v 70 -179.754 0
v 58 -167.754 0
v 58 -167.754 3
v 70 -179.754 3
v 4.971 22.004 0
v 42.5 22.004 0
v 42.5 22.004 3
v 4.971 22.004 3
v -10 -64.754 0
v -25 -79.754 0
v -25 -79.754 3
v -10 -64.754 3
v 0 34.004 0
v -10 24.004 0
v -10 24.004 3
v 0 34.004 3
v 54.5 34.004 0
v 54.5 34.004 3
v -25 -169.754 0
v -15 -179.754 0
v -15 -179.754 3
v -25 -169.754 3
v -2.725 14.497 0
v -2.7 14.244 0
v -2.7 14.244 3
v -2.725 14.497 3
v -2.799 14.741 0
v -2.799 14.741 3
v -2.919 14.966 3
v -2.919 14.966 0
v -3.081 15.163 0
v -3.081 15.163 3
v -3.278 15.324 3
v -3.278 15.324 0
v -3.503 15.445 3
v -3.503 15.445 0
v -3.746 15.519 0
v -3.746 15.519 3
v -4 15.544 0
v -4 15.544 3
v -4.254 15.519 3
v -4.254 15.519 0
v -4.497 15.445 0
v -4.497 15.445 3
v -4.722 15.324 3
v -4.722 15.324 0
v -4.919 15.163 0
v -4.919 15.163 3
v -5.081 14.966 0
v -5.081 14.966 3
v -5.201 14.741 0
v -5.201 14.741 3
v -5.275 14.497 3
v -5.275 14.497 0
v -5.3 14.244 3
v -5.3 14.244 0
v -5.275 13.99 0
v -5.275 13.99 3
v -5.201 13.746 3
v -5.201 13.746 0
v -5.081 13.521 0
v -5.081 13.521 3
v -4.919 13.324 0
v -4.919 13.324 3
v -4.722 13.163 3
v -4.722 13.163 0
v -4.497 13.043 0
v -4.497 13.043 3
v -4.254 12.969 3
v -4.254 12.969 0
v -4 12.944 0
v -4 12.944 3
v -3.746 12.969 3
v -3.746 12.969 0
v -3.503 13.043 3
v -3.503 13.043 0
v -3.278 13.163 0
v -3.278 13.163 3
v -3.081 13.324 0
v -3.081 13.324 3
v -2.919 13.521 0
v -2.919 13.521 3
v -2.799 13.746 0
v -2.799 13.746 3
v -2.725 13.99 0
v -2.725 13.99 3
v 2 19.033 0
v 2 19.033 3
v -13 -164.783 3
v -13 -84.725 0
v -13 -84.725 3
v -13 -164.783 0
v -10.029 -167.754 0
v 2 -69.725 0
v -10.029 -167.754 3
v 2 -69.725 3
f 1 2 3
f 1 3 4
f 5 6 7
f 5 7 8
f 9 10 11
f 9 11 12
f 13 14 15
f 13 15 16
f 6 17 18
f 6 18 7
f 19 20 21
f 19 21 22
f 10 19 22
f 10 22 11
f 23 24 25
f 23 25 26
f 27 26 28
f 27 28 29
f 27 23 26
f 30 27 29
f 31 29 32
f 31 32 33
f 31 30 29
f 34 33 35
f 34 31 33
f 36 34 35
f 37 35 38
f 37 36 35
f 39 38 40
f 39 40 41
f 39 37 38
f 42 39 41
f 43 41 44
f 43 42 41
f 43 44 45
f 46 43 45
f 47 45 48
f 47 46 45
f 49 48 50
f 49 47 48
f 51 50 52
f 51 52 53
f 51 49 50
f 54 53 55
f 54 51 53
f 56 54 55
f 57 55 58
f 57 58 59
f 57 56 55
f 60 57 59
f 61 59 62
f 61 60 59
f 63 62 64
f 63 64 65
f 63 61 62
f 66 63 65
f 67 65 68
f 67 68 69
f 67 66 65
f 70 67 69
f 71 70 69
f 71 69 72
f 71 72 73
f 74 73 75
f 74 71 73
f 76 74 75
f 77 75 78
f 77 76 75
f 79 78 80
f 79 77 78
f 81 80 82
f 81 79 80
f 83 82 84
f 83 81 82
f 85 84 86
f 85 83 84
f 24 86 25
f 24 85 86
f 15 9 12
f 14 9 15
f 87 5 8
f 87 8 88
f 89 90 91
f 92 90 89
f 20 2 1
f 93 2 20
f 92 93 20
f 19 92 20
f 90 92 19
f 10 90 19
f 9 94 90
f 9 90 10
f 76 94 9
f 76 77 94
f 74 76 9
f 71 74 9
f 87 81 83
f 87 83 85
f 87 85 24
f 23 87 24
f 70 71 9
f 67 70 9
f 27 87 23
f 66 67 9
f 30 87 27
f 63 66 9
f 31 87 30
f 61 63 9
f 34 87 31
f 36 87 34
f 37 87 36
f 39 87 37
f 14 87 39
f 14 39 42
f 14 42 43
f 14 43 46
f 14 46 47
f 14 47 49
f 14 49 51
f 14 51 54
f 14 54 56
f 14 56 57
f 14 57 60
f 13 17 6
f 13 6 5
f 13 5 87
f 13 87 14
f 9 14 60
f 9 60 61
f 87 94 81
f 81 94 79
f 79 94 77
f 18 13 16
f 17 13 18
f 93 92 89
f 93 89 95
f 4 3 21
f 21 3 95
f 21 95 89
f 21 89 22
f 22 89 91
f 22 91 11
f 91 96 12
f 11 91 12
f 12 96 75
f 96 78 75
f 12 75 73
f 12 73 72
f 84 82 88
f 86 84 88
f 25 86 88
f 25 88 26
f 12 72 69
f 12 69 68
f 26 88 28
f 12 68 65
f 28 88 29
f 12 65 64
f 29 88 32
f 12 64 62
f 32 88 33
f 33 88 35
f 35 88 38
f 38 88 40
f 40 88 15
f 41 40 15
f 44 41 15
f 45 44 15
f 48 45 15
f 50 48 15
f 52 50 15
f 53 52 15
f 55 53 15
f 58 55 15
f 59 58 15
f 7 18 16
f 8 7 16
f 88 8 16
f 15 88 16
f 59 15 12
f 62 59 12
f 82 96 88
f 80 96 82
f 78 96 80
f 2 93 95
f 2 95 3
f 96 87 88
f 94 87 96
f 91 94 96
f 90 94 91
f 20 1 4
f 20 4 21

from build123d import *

# Parameters (mm, degrees)
SKETCH1_R      = 1.3
EXTRUDE1_DEPTH = 3


with BuildPart() as part:
    # Sketch1 → Extrude1 (new body)
    with BuildSketch(Plane.XY):
        Polygon((70, -179.753959847), (-15, -179.753959847), (-25, -169.753959847), (-25, -79.753959847), (-10, -64.753959847), (-10, 24.003545781), (0, 34.003545781), (54.5, 34.003545781), (42.5, 22.003545781), (4.970562749, 22.003545781), (2, 19.032983033), (2, -69.724522596), (-13, -84.724522596), (-13, -164.783397099), (-10.029437251, -167.753959847), (58, -167.753959847), align=None)
        with Locations((-4, 14.243545781)):
            Circle(SKETCH1_R, mode=Mode.SUBTRACT)
    extrude(amount=EXTRUDE1_DEPTH)


solid = part.part
